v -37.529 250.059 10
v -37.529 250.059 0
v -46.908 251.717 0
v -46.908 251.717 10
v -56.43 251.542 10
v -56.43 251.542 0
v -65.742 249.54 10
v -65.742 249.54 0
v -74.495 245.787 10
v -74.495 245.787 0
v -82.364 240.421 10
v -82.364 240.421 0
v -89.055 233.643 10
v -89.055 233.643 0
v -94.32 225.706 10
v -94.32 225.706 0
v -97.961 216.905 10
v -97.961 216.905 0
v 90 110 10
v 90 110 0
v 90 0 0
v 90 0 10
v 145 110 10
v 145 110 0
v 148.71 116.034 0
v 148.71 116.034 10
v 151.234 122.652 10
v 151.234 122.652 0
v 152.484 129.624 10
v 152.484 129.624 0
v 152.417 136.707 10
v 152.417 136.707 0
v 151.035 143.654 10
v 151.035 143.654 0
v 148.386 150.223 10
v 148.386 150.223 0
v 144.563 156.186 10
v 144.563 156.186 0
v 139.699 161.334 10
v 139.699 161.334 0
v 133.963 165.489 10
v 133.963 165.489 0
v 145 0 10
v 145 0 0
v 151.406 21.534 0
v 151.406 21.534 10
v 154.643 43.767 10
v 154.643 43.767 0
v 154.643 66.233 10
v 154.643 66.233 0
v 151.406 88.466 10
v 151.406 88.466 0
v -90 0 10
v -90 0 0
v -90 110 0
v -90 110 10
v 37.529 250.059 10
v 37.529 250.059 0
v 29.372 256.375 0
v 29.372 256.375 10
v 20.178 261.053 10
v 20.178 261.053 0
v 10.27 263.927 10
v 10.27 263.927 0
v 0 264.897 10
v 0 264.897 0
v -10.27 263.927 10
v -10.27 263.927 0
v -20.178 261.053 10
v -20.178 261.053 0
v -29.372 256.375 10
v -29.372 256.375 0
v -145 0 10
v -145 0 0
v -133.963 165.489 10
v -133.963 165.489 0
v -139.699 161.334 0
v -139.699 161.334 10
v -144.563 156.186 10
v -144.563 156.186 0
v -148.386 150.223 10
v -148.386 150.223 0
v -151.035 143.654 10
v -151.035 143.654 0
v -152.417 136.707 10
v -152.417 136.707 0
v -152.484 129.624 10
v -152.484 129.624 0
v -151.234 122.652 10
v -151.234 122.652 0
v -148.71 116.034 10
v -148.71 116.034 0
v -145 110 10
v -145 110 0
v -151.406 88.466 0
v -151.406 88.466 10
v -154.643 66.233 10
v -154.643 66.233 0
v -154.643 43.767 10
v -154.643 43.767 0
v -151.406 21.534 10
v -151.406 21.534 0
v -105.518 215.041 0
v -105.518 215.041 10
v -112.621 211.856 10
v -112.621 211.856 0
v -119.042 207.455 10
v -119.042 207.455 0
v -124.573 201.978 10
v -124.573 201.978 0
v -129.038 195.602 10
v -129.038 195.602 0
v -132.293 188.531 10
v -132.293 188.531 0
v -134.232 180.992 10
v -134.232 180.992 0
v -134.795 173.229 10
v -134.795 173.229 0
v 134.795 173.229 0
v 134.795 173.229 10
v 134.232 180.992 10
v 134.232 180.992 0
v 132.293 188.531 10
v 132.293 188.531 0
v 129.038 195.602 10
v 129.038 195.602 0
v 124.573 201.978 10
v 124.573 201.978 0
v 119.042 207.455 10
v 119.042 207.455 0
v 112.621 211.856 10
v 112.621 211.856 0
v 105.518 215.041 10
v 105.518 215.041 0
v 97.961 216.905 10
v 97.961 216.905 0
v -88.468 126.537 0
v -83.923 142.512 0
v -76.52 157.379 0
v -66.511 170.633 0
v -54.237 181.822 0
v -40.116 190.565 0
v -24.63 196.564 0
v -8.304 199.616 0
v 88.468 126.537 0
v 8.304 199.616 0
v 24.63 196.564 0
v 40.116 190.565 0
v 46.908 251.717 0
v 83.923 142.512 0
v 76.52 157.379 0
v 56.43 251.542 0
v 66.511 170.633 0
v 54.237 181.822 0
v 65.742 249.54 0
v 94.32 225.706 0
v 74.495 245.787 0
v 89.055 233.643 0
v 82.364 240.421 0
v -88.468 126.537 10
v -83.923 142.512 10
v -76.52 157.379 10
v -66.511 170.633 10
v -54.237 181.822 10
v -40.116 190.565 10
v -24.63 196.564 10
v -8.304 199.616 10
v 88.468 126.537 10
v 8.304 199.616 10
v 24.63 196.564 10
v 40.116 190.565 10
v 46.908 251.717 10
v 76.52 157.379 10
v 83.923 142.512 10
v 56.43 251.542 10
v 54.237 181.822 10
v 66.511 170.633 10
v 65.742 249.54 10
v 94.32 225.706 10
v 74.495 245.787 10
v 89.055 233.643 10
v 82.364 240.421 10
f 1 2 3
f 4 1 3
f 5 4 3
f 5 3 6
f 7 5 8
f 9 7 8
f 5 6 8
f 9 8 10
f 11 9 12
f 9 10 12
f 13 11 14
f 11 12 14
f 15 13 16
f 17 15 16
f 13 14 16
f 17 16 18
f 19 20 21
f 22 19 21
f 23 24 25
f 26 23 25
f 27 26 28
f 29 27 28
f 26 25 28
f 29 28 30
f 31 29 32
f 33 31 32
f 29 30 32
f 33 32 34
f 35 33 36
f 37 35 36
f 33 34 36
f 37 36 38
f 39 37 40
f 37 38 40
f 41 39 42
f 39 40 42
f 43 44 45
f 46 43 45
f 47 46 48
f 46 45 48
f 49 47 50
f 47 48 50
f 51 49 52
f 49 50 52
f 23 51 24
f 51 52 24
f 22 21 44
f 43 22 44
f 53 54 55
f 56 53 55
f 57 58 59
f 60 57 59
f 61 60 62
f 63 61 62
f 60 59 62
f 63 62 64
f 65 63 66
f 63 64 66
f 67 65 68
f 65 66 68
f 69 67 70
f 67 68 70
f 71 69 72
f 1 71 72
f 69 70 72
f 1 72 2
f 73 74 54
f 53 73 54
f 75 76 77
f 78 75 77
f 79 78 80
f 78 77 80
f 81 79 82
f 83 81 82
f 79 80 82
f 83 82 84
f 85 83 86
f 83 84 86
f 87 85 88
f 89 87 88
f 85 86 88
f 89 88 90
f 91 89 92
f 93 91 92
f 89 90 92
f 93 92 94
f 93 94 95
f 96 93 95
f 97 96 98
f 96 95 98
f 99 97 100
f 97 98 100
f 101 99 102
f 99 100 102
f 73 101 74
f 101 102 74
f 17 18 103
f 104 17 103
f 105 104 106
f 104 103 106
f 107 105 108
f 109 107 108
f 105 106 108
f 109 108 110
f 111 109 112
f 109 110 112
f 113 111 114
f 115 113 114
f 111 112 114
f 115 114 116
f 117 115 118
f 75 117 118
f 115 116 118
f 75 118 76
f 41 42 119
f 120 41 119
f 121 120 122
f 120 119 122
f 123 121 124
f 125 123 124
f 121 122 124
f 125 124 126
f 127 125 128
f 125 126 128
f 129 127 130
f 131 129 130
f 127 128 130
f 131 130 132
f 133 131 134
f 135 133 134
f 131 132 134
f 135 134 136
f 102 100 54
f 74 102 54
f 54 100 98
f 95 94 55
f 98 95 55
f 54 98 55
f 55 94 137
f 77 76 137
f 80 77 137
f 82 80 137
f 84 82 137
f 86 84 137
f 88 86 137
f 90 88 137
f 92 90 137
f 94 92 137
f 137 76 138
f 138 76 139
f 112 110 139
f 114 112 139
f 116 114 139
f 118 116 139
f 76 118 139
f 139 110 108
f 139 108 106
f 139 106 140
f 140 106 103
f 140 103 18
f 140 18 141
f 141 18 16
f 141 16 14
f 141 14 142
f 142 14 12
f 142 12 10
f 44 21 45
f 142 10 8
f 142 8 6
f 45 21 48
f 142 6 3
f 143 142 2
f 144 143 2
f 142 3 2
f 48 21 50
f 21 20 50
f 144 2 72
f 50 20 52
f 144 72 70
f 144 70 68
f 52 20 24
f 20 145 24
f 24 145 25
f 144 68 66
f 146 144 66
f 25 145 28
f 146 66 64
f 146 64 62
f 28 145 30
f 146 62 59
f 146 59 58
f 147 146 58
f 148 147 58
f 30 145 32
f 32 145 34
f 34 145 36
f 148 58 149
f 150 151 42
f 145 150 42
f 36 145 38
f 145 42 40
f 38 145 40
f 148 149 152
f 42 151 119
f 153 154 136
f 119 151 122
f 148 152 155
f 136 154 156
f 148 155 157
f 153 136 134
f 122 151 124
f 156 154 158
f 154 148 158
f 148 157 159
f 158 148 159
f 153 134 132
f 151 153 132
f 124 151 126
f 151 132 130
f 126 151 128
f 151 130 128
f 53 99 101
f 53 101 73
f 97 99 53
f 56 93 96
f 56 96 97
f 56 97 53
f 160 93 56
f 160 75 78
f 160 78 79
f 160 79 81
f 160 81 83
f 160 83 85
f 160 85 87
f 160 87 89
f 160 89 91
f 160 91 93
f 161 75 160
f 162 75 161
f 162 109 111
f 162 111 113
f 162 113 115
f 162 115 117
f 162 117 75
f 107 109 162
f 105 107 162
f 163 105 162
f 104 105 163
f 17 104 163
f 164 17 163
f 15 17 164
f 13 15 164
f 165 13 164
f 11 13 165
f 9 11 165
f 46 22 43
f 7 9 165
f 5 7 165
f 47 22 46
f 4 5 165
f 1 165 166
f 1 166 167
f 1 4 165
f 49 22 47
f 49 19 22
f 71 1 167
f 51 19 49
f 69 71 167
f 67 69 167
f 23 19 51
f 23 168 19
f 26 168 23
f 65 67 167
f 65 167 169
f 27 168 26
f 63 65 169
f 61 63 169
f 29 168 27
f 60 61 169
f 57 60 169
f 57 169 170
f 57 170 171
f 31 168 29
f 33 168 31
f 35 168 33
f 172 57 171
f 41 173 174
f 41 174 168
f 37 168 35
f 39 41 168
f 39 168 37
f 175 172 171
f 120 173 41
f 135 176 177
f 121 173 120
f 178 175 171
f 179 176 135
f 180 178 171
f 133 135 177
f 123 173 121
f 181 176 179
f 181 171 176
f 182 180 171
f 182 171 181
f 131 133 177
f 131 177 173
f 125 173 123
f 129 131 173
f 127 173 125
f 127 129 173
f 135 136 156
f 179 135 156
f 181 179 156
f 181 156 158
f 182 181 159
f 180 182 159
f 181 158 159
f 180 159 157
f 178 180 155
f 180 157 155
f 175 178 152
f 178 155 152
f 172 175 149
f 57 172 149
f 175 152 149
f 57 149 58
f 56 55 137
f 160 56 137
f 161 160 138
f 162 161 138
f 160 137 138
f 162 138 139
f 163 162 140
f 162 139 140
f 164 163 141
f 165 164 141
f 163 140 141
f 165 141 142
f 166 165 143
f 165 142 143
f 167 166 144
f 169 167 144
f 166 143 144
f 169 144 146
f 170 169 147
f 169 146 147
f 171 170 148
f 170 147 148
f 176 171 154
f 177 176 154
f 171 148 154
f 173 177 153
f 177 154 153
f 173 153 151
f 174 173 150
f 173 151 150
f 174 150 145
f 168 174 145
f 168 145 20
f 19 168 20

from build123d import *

# Parameters (mm, degrees)
F2_DEPTH = 10


with BuildPart() as f2:
    # F1 (on Top) → F2 (new body)
    with BuildSketch(Plane.XY):
        with BuildLine():
            ThreePointArc((-105, 110), (0, 215), (105, 110))
            Line((105, 110), (105, 0))
            Line((105, 0), (145, 0))
            Line((145, 0), (145, 110))
            ThreePointArc((145, 110), (142.2138656585, 138.2880966923), (133.9625322141, 165.4890976929))
            ThreePointArc((133.9625322141, 165.4890976929), (118.7770464219, 193.1685832709), (97.9605801043, 216.9052138375))
            ThreePointArc((97.9605801043, 216.9052138375), (69.7433714933, 237.1253795776), (37.5287615399, 250.0592448119))
            ThreePointArc((37.5287615399, 250.0592448119), (0, 255), (-37.5287615399, 250.0592448119))
            ThreePointArc((-37.5287615399, 250.0592448119), (-69.7433714933, 237.1253795776), (-97.9605801043, 216.9052138375))
            ThreePointArc((-97.9605801043, 216.9052138375), (-118.7770464219, 193.1685832709), (-133.9625322141, 165.4890976929))
            ThreePointArc((-133.9625322141, 165.4890976929), (-142.2138656585, 138.2880966923), (-145, 110))
            Line((-145, 110), (-145, 0))
            Line((-145, 0), (-105, 0))
            Line((-105, 0), (-105, 110))
        make_face()
        with BuildLine():
            ThreePointArc((-145, 110), (-155.0496837882, 55), (-145, 0))
            Line((-145, 0), (-145, 110))
        make_face()
        with BuildLine():
            ThreePointArc((-133.9625322141, 165.4890976929), (-151.8883856552, 140.2124783682), (-145, 110))
            ThreePointArc((-145, 110), (-142.2138656585, 138.2880966923), (-133.9625322141, 165.4890976929))
        make_face()
        with BuildLine():
            ThreePointArc((-97.9605801043, 216.9052138375), (-126.948851738, 198.890542954), (-133.9625322141, 165.4890976929))
            ThreePointArc((-133.9625322141, 165.4890976929), (-118.7770464219, 193.1685832709), (-97.9605801043, 216.9052138375))
        make_face()
        with BuildLine():
            ThreePointArc((-37.5287615399, 250.0592448119), (-74.4950323823, 245.7865136926), (-97.9605801043, 216.9052138375))
            ThreePointArc((-97.9605801043, 216.9052138375), (-69.7433714933, 237.1253795776), (-37.5287615399, 250.0592448119))
        make_face()
        with BuildLine():
            ThreePointArc((-37.5287615399, 250.0592448119), (0, 255), (37.5287615399, 250.0592448119))
            ThreePointArc((37.5287615399, 250.0592448119), (0, 264.8969025948), (-37.5287615399, 250.0592448119))
        make_face()
        with BuildLine():
            ThreePointArc((37.5287615399, 250.0592448119), (69.7433714933, 237.1253795776), (97.9605801043, 216.9052138375))
            ThreePointArc((97.9605801043, 216.9052138375), (74.4950323823, 245.7865136926), (37.5287615399, 250.0592448119))
        make_face()
        with BuildLine():
            ThreePointArc((97.9605801043, 216.9052138375), (118.7770464219, 193.1685832709), (133.9625322141, 165.4890976929))
            ThreePointArc((133.9625322141, 165.4890976929), (126.948851738, 198.890542954), (97.9605801043, 216.9052138375))
        make_face()
        with BuildLine():
            ThreePointArc((133.9625322141, 165.4890976929), (142.2138656585, 138.2880966923), (145, 110))
            ThreePointArc((145, 110), (151.8883856552, 140.2124783682), (133.9625322141, 165.4890976929))
        make_face()
        with BuildLine():
            Line((145, 110), (145, 0))
            ThreePointArc((145, 0), (155.0496837882, 55), (145, 110))
        make_face()
        with BuildLine():
            Line((105, 0), (105, 110))
            ThreePointArc((105, 110), (0, 215), (-105, 110))
            Line((-105, 110), (-105, 0))
            Line((-105, 0), (-90, 0))
            Line((-90, 0), (-90, 110))
            ThreePointArc((-90, 110), (0, 200), (90, 110))
            Line((90, 110), (90, 2.92e-08))
            Line((90, 0), (105, 0))
        make_face()
    extrude(amount=F2_DEPTH)


solid = f2.part
